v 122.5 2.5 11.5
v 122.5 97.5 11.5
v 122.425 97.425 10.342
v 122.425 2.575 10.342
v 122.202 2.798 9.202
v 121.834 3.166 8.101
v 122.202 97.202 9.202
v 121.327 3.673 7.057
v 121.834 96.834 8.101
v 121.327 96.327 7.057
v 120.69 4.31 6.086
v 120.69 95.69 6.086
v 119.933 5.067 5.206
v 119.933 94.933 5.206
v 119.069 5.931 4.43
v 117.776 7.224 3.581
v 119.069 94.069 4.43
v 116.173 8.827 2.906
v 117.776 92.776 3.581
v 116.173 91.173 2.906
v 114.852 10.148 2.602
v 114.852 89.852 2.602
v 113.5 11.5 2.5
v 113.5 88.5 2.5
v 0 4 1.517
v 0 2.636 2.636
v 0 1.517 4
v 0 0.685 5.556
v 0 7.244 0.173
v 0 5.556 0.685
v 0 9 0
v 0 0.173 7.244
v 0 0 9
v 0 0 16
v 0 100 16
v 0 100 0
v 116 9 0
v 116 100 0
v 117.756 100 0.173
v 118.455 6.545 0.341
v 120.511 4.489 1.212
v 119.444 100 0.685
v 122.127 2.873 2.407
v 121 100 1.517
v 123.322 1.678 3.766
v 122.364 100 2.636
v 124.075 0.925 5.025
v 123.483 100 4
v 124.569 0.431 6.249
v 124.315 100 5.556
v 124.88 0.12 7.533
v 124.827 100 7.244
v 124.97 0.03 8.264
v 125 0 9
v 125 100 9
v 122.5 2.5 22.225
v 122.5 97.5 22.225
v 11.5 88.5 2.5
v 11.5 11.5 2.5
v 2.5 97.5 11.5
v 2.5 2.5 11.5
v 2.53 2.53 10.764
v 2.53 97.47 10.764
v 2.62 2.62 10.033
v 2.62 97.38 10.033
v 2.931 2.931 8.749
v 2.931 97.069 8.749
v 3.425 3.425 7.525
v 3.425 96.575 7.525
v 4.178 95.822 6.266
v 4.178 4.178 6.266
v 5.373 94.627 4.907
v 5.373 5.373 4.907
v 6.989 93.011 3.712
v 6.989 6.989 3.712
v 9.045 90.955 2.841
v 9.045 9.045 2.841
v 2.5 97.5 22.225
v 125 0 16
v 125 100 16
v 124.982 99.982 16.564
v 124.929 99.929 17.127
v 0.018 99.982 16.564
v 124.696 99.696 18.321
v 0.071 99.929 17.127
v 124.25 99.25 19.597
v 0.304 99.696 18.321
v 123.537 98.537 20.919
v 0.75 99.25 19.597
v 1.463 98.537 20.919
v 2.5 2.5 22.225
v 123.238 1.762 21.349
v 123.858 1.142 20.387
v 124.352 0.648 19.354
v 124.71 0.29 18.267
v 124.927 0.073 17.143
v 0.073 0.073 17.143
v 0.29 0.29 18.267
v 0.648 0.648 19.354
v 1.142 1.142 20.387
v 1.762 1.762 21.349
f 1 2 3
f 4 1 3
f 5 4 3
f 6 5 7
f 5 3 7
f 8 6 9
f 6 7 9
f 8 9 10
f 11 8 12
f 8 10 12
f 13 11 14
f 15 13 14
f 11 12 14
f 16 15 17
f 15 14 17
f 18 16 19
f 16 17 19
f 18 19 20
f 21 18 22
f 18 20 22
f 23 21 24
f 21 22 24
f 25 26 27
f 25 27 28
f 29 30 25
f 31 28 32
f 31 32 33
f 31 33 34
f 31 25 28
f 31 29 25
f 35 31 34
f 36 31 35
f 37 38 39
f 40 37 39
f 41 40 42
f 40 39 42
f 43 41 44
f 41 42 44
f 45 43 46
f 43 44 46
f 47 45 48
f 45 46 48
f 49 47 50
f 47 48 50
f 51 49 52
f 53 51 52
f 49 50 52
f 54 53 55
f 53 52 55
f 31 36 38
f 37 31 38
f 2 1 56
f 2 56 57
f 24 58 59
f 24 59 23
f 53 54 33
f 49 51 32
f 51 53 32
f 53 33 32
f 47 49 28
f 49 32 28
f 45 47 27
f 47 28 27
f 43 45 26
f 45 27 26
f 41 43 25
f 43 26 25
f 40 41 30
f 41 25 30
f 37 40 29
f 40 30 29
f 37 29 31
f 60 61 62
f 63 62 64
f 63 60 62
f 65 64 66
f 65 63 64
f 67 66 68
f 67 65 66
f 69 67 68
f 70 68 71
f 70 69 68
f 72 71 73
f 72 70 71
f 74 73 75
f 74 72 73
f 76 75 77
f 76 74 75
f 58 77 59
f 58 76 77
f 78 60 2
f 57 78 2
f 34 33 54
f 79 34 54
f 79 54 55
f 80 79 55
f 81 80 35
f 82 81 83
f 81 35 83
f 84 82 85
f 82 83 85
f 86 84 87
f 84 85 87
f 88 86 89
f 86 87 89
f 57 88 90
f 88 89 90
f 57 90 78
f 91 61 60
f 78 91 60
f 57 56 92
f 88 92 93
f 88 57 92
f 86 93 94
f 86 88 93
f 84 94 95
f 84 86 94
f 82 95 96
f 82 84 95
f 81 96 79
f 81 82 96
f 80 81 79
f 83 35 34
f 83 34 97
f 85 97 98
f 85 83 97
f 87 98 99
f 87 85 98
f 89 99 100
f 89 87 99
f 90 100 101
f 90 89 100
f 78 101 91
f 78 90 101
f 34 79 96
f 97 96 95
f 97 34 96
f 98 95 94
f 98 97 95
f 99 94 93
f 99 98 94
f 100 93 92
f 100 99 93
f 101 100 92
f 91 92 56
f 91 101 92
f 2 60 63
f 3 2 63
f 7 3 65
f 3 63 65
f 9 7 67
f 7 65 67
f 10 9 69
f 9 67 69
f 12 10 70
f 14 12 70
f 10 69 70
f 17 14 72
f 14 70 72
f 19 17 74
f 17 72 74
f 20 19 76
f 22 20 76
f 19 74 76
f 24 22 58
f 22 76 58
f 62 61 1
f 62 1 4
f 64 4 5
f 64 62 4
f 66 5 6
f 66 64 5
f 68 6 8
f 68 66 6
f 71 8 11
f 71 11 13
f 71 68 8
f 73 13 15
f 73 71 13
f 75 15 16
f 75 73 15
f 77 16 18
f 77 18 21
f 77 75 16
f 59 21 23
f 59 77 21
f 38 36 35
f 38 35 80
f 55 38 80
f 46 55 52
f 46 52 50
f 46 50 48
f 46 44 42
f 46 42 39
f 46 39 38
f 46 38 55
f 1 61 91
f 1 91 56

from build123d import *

# Parameters (mm, degrees)
F0_W        = 125
F0_H        = 100
F1_DEPTH    = 25
F2_T        = -2.5
F3_T1_DEPTH = 95
F3_T3_DEPTH = 120
F3_T5_DEPTH = 170
F3_T7_DEPTH = 145


# Not quite as in the source:
# - a fillet or chamfer that OpenCascade refuses, or shapes differently, is made with other operations: its cross-section is extruded or revolved along the edge and cut away or added


with BuildPart() as f1:
    # F0 (on Top) → F1 (new body)
    with BuildSketch(Plane.XY):
        with Locations((62.5, 50)):
            Rectangle(F0_W, F0_H)
    extrude(amount=F1_DEPTH)

    # F2
    f2_openings = [f1.faces().sort_by_distance(p)[0] for p in [
        (62.5, 50, 25),
    ]]
    offset(amount=F2_T, openings=f2_openings)

    # F3: fillet of radius 9 on 10 edges, made by hand

    # F3_s2 → F3_t1 (join)
    with BuildSketch(Plane.XZ.offset(-97.5)):
        with BuildLine():
            ThreePointArc((2.5, 11.5), (5.1360389693, 5.1360389693), (11.5, 2.5))
            Line((11.5, 2.5), (2.5, 2.5))
            Line((2.5, 2.5), (2.5, 11.5))
        make_face()
        with BuildLine():
            ThreePointArc((122.5, 11.5), (119.8639610307, 5.1360389693), (113.5, 2.5))
            Line((113.5, 2.5), (122.5, 2.5))
            Line((122.5, 2.5), (122.5, 11.5))
        make_face()
    extrude(amount=F3_T1_DEPTH)

    # F3_s4 → F3_t3 (join)
    with BuildSketch(Plane.YZ.offset(2.5)):
        with BuildLine():
            ThreePointArc((2.5, 11.5), (5.1360389693, 5.1360389693), (11.5, 2.5))
            Line((11.5, 2.5), (2.5, 2.5))
            Line((2.5, 2.5), (2.5, 11.5))
        make_face()
        with BuildLine():
            ThreePointArc((97.5, 11.5), (94.8639610307, 5.1360389693), (88.5, 2.5))
            Line((88.5, 2.5), (97.5, 2.5))
            Line((97.5, 2.5), (97.5, 11.5))
        make_face()
    extrude(amount=F3_T3_DEPTH)

    # F3_s6 → F3_t5 (cut)
    with BuildSketch(Plane.YZ.offset(-22.5)):
        with BuildLine():
            ThreePointArc((0, 16), (2.6360389693, 22.3639610307), (9, 25))
            Line((9, 25), (0, 25))
            Line((0, 25), (0, 16))
        make_face()
        with BuildLine():
            ThreePointArc((0, 9), (2.6360389693, 2.6360389693), (9, 0))
            Line((9, 0), (0, 0))
            Line((0, 0), (0, 9))
        make_face()
        with BuildLine():
            ThreePointArc((100, 16), (97.3639610307, 22.3639610307), (91, 25))
            Line((91, 25), (100, 25))
            Line((100, 25), (100, 16))
        make_face()
    extrude(amount=F3_T5_DEPTH, mode=Mode.SUBTRACT)

    # F3_s8 → F3_t7 (cut)
    with BuildSketch(Plane.XZ.offset(-122.5)):
        with BuildLine():
            ThreePointArc((116, 0), (122.3639610307, 2.6360389693), (125, 9))
            Line((125, 9), (125, 0))
            Line((125, 0), (116, 0))
        make_face()
        with BuildLine():
            ThreePointArc((116, 25), (122.3639610307, 22.3639610307), (125, 16))
            Line((125, 16), (125, 25))
            Line((125, 25), (116, 25))
        make_face()
        with BuildLine():
            ThreePointArc((0, 16), (2.6360389693, 22.3639610307), (9, 25))
            Line((9, 25), (0, 25))
            Line((0, 25), (0, 16))
        make_face()
    extrude(amount=F3_T7_DEPTH, mode=Mode.SUBTRACT)


solid = f1.part
